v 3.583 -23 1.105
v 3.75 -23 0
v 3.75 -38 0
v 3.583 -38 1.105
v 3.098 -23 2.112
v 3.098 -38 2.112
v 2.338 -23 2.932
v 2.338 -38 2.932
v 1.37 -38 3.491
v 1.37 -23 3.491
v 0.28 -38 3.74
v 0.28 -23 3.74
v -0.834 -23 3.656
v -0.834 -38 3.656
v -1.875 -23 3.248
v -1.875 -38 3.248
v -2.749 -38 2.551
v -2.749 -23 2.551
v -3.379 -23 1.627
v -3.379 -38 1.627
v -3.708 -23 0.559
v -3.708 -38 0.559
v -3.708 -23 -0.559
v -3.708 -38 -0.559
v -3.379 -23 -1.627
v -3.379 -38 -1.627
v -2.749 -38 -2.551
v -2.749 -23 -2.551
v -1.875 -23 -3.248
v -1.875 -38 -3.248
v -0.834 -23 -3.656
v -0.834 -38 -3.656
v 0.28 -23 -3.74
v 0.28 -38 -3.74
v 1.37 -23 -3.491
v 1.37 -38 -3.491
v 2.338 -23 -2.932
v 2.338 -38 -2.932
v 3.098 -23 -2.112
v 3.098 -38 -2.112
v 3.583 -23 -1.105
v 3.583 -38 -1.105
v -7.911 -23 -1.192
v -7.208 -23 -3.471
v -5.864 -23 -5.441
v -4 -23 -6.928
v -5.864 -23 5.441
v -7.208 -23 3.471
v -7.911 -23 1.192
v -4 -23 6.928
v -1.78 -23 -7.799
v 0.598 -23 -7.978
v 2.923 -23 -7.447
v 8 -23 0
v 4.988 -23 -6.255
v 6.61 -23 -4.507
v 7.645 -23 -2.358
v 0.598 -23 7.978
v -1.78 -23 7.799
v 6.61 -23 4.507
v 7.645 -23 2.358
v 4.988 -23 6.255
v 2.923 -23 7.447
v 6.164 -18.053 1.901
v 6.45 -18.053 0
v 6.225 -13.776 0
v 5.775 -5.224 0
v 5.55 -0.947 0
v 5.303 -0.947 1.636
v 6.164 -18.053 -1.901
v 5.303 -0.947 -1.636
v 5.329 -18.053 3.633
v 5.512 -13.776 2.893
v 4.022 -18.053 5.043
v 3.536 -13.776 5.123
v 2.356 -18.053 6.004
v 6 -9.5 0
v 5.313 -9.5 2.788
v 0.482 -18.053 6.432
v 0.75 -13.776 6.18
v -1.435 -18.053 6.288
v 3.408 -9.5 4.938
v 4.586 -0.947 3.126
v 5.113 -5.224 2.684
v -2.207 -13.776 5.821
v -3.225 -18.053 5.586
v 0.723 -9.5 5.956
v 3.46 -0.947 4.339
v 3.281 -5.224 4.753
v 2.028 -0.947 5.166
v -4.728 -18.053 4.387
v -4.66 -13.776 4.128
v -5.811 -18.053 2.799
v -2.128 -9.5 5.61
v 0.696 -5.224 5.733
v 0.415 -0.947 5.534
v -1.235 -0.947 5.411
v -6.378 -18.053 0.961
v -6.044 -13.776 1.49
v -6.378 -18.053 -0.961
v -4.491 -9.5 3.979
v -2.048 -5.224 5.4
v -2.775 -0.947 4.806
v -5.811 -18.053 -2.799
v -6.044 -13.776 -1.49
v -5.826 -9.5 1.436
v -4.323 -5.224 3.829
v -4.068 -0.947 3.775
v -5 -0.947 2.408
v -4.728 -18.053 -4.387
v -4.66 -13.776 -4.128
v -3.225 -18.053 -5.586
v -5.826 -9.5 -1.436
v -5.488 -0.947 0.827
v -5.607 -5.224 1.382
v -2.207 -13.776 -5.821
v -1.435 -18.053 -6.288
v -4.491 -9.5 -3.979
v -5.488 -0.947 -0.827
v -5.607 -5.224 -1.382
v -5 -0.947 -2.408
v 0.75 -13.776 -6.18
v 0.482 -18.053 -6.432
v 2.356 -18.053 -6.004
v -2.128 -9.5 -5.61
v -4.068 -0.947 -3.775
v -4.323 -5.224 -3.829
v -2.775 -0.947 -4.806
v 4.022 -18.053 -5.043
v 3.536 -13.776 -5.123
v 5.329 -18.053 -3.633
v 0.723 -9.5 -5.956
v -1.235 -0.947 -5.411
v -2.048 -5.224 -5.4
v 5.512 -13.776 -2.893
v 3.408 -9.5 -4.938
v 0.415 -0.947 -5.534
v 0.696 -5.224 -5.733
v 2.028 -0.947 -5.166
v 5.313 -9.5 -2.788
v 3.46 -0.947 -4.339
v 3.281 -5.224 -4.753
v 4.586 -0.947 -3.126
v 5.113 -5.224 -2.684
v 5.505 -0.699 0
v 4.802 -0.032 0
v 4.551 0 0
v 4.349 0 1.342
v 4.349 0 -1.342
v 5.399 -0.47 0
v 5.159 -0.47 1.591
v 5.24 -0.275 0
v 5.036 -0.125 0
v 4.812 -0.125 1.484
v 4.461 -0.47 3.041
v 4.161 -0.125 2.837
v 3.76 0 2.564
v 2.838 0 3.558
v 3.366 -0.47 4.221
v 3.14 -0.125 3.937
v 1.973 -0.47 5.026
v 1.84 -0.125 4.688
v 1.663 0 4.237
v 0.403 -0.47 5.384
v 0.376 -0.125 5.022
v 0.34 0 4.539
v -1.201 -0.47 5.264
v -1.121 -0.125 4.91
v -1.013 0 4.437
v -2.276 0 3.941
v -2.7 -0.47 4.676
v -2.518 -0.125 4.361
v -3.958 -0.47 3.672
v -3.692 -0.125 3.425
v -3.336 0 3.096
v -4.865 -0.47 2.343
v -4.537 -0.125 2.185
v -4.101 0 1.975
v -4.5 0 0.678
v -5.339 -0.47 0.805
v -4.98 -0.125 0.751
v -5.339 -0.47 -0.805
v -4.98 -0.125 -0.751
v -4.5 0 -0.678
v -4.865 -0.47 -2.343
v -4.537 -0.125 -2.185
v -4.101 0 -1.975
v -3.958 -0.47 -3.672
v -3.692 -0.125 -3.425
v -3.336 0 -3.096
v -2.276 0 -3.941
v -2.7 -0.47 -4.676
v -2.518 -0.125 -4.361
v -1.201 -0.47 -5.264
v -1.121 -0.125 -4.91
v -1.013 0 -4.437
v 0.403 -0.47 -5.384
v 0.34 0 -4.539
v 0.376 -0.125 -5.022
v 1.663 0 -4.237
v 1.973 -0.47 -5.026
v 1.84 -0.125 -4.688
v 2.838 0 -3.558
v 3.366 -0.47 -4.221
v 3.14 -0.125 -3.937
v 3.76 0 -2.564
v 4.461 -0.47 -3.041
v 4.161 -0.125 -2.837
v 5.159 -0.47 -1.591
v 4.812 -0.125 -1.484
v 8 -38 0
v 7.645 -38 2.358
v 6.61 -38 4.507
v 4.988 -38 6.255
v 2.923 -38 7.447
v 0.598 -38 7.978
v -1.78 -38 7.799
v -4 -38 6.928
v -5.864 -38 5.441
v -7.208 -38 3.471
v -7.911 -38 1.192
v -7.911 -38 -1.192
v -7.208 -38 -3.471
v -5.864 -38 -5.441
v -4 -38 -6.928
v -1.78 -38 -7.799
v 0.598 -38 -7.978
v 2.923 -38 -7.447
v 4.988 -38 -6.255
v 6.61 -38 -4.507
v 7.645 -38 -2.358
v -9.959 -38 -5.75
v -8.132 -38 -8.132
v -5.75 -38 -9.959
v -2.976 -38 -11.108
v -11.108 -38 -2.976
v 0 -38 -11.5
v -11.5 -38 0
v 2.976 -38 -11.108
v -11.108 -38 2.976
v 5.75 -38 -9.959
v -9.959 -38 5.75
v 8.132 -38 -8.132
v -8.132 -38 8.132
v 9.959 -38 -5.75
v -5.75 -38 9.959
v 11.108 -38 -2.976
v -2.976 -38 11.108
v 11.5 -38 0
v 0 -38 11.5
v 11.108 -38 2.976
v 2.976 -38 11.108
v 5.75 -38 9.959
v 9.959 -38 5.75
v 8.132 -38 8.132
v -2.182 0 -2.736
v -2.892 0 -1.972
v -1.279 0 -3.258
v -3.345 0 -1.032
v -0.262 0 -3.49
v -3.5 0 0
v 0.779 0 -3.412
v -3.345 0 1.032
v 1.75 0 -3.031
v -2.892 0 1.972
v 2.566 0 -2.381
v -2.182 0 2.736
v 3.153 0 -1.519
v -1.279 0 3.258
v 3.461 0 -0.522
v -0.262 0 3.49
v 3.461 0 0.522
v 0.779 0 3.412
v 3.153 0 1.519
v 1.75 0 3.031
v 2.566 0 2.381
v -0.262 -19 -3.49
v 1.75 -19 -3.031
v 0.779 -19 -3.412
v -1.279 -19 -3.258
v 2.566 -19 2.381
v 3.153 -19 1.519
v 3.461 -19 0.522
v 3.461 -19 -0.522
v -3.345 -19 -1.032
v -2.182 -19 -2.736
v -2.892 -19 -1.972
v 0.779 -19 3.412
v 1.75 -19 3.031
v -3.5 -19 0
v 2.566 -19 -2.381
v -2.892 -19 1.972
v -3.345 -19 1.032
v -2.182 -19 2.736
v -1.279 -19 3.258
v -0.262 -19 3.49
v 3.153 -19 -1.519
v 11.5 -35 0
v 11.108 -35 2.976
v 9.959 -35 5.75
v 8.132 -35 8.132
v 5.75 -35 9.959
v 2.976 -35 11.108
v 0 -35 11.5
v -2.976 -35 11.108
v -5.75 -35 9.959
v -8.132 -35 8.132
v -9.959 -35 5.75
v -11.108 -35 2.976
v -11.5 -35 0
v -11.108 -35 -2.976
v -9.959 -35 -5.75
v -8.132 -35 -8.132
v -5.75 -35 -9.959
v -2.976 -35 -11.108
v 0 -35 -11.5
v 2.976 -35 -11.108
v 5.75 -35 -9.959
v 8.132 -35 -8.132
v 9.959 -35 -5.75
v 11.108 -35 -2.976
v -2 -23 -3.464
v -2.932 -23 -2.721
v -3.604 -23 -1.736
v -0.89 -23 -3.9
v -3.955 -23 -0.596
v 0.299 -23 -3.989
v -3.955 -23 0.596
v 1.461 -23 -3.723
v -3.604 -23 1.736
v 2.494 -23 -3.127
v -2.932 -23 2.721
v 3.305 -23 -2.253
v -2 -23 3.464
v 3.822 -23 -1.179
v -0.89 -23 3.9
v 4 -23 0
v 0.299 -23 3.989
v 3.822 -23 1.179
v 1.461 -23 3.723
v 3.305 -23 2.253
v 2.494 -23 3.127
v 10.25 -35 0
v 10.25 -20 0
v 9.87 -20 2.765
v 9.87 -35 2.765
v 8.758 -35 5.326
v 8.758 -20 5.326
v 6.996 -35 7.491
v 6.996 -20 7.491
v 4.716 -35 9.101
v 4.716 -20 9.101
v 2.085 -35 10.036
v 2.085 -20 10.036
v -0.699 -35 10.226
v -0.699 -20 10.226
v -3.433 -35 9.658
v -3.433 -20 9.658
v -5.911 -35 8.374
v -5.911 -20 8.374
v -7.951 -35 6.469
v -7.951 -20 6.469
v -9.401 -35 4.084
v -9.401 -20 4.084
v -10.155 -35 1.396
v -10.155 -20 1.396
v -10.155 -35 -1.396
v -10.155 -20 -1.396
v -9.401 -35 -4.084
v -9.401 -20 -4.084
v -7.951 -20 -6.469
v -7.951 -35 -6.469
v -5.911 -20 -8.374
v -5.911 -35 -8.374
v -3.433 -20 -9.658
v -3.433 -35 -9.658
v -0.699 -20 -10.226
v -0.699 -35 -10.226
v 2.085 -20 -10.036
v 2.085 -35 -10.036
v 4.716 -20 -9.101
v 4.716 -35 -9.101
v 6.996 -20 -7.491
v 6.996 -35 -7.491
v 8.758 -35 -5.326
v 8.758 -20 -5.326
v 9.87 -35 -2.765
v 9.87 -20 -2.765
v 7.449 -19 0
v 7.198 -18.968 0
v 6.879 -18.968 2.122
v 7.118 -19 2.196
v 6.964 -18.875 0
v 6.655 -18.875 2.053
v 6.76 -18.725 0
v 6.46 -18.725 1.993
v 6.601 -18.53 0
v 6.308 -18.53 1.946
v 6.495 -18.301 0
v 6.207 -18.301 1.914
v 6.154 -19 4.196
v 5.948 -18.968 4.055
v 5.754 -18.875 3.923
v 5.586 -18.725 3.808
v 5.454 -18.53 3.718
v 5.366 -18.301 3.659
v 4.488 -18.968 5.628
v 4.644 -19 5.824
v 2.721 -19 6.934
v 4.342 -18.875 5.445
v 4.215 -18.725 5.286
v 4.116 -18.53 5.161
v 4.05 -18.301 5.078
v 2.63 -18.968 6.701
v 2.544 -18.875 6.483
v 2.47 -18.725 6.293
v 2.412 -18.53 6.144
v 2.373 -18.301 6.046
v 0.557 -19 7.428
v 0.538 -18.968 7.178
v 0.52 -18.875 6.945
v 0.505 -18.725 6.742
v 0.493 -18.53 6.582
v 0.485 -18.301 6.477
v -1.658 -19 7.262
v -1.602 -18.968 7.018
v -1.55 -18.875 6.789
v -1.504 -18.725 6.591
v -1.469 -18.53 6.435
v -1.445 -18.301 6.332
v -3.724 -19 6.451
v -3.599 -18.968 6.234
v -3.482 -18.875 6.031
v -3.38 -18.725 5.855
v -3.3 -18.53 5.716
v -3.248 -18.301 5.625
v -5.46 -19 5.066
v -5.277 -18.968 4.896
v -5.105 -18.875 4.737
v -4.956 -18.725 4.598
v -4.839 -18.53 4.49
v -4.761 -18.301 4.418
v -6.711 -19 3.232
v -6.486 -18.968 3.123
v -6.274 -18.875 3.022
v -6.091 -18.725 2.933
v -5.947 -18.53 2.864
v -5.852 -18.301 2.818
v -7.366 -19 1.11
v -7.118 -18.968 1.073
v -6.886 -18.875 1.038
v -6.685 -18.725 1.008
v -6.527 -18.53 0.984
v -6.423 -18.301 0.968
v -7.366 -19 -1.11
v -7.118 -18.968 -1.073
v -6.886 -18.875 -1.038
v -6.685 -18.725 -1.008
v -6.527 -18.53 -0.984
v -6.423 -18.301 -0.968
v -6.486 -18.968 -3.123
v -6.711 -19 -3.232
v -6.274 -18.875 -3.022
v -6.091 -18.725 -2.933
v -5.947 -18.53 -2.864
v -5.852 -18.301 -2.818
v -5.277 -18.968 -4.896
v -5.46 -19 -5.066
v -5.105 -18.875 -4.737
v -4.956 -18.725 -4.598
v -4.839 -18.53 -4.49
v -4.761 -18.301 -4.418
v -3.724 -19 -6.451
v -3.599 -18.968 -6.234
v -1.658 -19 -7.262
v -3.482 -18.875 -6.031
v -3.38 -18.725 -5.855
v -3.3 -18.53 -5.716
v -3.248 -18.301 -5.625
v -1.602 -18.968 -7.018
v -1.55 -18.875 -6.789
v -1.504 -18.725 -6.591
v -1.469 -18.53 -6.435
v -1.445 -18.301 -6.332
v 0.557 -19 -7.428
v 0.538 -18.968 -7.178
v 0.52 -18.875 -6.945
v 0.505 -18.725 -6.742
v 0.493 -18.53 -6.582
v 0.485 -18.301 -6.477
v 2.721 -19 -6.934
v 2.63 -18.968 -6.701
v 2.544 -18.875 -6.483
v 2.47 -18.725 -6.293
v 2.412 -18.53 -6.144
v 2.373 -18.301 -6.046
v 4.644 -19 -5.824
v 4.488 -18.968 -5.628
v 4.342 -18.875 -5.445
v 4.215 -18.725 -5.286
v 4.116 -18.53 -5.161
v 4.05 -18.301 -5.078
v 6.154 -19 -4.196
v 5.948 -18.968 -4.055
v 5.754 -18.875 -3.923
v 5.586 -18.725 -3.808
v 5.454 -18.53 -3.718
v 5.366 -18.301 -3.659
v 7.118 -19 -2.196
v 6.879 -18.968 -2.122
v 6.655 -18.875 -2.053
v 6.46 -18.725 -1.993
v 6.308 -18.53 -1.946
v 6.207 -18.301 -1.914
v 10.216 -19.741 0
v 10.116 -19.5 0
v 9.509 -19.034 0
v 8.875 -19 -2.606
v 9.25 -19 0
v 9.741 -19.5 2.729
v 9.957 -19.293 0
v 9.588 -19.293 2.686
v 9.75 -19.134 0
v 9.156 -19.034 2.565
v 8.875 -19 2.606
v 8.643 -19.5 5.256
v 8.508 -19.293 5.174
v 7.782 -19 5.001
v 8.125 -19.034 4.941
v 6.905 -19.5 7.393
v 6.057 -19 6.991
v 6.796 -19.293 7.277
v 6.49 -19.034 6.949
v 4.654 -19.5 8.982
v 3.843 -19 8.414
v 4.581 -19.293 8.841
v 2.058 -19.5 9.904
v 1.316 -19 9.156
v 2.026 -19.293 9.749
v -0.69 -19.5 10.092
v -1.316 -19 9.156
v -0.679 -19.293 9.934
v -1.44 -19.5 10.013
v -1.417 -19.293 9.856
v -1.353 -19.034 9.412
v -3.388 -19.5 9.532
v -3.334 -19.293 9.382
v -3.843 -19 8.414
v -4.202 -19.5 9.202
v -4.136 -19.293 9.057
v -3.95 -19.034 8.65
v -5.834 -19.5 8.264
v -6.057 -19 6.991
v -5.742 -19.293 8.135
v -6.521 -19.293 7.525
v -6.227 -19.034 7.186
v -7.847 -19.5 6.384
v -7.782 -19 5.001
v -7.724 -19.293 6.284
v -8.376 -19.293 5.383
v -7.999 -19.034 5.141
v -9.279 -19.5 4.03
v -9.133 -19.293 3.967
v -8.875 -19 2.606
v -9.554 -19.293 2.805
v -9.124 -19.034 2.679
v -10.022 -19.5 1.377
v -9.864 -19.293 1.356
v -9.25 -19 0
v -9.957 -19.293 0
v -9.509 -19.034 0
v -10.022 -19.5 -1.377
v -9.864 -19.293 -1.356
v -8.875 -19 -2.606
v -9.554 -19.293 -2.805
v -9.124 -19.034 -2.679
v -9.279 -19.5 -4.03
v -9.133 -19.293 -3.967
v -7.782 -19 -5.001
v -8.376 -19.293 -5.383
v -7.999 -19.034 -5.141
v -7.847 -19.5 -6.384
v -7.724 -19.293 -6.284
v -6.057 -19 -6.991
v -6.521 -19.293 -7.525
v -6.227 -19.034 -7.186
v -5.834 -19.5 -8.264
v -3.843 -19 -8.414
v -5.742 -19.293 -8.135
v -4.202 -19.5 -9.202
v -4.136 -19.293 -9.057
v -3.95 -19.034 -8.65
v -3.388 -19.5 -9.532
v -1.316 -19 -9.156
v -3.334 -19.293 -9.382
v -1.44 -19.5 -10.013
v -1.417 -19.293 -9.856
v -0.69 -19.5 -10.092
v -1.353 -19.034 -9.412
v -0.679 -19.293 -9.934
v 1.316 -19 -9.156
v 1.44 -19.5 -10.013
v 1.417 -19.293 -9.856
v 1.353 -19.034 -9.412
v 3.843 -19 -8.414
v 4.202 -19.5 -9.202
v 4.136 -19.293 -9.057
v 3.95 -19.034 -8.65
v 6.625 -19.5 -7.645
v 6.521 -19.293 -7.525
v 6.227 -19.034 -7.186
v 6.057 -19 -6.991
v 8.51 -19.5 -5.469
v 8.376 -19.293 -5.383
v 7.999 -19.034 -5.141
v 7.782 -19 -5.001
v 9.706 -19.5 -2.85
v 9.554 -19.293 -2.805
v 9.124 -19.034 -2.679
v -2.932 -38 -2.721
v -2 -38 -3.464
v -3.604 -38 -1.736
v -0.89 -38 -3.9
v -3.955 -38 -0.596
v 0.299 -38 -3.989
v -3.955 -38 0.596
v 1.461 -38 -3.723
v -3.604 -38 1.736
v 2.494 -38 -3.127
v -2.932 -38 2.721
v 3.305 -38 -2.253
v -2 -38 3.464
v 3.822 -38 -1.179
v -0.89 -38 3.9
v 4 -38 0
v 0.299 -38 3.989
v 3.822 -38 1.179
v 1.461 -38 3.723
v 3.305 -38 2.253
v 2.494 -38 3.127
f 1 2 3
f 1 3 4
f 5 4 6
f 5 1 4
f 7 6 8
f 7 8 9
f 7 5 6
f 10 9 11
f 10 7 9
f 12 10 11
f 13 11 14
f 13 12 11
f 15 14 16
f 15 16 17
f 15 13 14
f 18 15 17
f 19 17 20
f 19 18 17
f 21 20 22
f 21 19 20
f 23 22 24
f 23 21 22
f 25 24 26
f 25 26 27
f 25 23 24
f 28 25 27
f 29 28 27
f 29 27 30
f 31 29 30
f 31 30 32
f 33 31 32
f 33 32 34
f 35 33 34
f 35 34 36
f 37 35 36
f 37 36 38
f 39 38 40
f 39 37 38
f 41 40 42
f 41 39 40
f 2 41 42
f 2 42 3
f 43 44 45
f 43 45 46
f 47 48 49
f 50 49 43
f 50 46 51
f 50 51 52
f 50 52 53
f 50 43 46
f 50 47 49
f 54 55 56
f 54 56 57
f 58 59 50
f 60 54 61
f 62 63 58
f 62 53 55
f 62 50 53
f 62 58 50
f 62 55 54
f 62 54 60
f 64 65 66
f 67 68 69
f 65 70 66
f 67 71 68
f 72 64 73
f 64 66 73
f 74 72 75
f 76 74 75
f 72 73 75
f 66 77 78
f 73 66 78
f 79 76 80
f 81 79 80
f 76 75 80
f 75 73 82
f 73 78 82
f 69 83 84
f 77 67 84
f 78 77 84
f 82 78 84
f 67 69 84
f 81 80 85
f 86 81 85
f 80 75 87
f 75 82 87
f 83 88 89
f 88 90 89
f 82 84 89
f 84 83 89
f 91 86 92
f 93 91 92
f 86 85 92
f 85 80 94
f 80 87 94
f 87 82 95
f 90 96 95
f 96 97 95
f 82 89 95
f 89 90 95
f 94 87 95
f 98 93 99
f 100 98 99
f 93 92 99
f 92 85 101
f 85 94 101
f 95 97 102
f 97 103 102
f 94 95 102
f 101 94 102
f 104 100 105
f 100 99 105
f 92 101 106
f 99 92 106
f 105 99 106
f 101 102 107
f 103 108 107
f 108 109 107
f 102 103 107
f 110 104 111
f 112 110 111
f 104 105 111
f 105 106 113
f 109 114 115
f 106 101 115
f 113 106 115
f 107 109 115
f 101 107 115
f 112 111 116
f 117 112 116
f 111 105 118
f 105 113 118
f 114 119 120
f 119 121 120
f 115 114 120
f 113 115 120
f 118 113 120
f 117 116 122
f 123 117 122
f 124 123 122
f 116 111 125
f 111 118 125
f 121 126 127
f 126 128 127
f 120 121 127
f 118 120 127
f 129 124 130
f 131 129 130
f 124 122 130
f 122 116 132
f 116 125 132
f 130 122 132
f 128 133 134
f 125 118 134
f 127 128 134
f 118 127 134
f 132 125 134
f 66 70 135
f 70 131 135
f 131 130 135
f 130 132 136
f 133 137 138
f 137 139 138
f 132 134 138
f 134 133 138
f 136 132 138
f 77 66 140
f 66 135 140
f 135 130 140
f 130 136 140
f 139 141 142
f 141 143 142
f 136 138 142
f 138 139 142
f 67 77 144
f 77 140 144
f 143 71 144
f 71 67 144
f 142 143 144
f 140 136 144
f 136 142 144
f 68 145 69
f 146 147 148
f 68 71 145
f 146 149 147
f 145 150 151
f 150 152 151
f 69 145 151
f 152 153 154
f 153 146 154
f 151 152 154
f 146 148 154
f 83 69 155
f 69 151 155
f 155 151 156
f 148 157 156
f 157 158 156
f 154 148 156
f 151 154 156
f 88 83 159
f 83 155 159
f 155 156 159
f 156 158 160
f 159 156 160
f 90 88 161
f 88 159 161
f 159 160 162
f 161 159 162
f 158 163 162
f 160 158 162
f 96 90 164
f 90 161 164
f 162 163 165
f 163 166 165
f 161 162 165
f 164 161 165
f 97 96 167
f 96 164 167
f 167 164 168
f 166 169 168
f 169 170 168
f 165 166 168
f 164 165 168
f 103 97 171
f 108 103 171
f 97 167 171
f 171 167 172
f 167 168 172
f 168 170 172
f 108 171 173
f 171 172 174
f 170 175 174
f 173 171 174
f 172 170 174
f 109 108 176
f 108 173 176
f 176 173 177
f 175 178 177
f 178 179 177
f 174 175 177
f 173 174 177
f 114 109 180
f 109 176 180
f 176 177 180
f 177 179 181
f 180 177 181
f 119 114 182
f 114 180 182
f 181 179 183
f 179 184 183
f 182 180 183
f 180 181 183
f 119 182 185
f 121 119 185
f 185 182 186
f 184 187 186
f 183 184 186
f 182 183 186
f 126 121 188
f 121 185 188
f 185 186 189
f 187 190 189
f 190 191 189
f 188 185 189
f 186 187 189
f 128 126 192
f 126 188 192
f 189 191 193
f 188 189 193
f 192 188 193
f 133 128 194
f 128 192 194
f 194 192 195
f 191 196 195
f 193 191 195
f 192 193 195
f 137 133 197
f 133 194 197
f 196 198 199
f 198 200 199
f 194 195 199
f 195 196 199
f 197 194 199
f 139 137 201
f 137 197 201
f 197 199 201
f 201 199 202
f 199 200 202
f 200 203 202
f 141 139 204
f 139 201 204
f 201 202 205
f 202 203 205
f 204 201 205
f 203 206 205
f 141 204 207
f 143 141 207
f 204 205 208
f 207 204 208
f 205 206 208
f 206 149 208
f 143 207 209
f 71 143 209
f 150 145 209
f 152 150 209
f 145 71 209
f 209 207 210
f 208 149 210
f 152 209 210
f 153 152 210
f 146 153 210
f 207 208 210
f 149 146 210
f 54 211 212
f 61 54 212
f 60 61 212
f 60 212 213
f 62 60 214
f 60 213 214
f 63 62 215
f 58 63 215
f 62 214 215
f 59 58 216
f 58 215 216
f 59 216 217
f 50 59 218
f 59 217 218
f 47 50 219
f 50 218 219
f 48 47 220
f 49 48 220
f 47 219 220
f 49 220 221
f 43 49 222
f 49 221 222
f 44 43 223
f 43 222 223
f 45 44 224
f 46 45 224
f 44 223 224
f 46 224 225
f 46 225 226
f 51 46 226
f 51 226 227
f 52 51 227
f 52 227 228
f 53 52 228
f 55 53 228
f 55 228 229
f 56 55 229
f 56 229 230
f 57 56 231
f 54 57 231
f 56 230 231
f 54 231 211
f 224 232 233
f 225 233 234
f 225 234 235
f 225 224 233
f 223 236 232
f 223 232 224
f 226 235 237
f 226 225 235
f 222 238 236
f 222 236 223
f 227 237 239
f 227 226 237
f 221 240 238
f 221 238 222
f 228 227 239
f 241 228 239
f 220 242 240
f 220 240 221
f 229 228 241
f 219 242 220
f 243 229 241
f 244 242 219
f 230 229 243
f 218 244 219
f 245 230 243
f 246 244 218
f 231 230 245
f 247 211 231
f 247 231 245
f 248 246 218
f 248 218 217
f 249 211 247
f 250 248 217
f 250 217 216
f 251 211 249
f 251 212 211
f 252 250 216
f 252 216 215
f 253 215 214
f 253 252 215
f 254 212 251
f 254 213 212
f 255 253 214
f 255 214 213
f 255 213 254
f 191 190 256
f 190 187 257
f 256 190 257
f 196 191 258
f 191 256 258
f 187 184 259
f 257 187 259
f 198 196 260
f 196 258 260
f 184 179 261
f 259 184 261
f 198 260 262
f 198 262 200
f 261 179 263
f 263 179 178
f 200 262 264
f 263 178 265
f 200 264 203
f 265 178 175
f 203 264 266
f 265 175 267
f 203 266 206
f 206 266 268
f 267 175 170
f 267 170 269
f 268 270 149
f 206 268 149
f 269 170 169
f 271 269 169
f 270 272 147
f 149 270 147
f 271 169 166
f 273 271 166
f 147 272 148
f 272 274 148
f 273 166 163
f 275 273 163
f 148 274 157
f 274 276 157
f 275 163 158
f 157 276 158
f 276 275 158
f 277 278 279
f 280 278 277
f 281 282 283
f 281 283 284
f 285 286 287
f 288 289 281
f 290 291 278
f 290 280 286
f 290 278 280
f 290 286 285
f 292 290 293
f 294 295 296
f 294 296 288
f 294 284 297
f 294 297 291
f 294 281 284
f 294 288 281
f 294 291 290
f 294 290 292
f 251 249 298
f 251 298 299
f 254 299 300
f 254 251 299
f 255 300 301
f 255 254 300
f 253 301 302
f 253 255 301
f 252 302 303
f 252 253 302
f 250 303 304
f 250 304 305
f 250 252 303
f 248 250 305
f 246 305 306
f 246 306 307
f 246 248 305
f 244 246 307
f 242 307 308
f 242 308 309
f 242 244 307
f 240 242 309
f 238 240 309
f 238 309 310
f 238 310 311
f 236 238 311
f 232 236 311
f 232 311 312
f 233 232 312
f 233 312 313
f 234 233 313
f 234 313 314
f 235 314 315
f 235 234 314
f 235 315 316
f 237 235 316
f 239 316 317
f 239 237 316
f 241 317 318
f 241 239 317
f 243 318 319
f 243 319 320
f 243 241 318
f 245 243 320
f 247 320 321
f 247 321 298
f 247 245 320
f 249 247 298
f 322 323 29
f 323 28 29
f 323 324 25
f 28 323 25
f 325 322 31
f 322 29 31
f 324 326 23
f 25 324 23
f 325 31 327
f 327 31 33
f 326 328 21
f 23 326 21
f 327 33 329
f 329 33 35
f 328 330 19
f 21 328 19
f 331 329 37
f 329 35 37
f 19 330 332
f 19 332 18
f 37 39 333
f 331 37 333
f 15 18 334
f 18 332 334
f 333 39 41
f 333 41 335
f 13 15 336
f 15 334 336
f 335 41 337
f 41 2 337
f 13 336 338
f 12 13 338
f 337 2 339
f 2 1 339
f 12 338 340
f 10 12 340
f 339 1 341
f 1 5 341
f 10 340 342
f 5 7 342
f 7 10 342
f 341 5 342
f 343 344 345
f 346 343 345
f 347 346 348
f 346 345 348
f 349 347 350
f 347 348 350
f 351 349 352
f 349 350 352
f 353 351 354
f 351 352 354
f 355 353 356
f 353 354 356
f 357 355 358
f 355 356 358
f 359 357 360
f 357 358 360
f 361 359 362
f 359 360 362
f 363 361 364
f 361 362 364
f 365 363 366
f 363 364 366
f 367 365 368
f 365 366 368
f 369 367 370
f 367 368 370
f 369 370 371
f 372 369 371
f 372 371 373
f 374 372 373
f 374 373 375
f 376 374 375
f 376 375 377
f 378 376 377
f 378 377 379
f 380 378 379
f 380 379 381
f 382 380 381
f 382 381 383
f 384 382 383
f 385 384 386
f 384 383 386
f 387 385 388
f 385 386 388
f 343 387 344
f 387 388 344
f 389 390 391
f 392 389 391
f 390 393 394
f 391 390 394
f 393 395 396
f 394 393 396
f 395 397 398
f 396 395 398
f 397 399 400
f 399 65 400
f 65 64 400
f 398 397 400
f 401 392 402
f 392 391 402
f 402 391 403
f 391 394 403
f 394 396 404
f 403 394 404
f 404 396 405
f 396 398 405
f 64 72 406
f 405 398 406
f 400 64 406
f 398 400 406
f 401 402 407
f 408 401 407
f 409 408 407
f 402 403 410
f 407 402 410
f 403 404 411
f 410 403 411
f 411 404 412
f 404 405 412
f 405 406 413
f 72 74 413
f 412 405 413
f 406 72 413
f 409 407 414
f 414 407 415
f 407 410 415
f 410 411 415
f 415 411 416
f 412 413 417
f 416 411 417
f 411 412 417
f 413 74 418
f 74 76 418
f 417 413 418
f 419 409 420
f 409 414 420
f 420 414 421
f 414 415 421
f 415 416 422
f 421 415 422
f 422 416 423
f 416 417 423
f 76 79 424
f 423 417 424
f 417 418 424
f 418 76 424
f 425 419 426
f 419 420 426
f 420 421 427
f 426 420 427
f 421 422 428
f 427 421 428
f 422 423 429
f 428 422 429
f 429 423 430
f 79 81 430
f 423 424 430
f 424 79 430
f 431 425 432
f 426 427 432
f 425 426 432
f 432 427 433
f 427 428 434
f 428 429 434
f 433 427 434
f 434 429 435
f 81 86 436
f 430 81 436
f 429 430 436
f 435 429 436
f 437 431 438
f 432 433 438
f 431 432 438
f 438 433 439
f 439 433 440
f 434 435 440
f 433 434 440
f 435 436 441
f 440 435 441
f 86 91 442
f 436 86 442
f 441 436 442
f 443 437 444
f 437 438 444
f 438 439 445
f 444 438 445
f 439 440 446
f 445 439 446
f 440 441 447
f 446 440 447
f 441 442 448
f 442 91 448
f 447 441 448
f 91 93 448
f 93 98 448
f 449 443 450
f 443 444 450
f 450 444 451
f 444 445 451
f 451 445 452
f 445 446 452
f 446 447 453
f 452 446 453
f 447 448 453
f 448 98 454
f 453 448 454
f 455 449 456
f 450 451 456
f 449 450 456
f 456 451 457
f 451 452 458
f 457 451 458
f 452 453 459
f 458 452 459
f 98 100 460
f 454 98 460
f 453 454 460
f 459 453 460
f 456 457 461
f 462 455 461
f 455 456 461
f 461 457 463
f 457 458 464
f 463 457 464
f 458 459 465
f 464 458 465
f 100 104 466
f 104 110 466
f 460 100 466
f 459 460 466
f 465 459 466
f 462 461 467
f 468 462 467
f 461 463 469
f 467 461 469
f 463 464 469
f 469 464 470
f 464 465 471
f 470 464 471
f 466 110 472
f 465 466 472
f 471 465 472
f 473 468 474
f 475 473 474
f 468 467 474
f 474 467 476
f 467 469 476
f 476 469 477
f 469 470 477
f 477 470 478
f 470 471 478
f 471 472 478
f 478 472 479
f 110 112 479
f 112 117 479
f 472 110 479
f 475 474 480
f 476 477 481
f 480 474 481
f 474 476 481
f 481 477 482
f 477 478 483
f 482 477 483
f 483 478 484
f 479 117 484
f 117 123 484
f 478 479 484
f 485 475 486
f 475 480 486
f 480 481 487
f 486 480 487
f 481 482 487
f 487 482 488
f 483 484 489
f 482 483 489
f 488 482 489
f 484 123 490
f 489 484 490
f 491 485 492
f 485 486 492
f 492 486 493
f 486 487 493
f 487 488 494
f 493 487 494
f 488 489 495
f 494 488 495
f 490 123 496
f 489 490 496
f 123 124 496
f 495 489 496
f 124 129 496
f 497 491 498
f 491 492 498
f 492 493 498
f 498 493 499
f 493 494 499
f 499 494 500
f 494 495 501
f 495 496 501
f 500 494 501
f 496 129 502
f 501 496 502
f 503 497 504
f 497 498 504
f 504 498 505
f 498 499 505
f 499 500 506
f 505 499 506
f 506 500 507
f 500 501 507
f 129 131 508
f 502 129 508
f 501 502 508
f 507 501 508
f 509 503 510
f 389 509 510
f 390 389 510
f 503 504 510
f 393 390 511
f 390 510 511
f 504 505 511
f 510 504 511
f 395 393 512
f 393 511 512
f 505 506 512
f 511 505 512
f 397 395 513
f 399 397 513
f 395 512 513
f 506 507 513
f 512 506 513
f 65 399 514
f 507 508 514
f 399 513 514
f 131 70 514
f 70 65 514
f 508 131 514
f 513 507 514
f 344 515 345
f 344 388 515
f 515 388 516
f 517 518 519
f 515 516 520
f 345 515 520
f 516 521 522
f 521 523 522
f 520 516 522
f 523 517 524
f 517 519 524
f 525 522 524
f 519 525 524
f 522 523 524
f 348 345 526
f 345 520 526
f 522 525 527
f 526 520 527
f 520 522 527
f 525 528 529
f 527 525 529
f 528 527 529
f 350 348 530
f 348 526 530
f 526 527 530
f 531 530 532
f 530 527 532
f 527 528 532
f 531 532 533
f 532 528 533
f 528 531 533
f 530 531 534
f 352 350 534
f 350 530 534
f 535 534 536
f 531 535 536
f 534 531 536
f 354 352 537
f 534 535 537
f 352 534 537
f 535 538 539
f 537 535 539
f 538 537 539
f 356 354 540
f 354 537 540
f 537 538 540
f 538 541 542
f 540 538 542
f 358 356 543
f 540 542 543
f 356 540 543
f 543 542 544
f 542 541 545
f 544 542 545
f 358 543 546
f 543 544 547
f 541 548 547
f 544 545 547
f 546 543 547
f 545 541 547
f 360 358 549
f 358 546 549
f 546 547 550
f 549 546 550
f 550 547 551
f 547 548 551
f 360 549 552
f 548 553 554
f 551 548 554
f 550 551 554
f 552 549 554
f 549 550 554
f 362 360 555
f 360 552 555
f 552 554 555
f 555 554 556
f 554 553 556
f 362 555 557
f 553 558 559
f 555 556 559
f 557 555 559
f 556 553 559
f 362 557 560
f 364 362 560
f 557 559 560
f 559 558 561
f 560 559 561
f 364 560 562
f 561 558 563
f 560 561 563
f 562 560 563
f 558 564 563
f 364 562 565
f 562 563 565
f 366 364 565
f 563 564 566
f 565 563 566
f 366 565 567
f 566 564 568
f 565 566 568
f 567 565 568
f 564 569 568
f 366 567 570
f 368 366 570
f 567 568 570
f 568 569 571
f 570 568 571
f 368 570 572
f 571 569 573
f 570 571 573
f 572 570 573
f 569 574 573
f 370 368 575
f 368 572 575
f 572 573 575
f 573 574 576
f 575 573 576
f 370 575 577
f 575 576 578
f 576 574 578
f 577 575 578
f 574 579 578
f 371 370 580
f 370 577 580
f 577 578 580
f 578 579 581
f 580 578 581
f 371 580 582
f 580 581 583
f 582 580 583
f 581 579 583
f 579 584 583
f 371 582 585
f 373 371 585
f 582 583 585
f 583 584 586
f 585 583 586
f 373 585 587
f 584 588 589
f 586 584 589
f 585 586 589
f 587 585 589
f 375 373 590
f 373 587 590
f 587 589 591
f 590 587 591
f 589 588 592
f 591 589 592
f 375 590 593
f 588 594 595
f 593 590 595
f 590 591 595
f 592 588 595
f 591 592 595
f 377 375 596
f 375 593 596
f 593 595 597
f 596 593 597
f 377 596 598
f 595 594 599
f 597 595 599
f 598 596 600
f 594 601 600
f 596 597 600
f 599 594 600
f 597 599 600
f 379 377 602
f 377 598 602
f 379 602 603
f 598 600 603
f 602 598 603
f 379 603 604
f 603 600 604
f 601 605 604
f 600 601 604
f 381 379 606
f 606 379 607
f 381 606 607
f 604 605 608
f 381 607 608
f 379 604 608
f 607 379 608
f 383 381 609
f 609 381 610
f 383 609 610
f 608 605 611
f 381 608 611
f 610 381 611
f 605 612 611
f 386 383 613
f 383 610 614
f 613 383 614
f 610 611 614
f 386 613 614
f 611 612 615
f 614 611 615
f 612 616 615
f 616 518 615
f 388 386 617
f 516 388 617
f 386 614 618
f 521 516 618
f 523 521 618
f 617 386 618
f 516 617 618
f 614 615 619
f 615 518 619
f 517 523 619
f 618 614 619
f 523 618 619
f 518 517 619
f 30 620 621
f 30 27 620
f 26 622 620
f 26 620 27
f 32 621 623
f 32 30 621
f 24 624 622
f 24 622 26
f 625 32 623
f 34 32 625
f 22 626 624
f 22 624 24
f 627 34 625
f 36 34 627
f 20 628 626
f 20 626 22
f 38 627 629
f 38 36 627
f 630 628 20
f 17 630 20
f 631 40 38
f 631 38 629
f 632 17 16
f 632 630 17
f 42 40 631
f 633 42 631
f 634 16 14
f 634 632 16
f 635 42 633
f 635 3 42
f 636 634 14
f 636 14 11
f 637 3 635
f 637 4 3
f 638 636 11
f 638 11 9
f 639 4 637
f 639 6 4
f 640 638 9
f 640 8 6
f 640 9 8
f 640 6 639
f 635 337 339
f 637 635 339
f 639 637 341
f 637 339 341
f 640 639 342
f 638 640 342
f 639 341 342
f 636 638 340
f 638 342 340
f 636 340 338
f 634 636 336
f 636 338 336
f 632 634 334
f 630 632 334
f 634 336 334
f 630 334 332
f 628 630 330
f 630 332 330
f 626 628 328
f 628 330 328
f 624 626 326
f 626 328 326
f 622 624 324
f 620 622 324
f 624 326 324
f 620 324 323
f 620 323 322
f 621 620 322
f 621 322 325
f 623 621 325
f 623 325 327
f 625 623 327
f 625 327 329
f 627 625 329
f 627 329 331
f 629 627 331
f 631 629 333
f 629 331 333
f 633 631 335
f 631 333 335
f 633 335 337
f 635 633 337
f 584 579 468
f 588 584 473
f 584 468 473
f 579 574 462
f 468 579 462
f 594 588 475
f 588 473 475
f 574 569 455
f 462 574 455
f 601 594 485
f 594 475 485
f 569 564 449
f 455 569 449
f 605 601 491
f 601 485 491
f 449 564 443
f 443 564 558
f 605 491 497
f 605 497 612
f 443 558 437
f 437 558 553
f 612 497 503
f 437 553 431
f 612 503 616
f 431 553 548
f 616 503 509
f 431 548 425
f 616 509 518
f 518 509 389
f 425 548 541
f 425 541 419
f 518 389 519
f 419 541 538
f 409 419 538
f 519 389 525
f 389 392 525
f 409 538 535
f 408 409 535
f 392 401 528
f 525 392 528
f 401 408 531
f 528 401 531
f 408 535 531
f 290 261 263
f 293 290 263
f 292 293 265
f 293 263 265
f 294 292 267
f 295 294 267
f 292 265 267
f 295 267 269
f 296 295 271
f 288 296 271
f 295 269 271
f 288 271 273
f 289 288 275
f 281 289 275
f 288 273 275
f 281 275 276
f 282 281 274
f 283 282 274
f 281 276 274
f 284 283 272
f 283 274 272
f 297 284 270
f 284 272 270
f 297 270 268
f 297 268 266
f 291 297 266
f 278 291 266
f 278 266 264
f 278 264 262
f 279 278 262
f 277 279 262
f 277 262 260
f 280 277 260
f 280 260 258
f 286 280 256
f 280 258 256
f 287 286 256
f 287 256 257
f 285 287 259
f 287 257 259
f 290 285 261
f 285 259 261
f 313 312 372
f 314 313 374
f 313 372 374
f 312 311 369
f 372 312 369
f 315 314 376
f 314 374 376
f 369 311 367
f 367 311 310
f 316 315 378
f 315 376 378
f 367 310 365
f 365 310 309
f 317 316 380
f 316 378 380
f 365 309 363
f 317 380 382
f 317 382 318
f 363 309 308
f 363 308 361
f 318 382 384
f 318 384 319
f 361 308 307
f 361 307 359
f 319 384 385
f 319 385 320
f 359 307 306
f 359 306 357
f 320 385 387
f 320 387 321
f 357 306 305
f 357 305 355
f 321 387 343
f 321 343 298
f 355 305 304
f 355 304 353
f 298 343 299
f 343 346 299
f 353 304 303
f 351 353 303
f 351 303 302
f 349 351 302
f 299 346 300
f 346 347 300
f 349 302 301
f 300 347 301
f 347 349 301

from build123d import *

# Parameters (mm, degrees)
F2_R      = 6.5
F0_R      = 5.5
F4_R      = 10.25
F5_DEPTH  = 19
F6_R      = 11.5
F7_DEPTH  = 3
F8_R      = 3.5
F9_DEPTH  = 19
F10_R     = 8
F11_DEPTH = 15
F12_R     = 4
F12_R_2   = 3.75
F13_DEPTH = 15
F14_R     = 1


with BuildPart() as f3:
    # F2 (on offset) → F3 section 0
    with BuildSketch(Plane.XZ.offset(19)):
        Circle(F2_R)
    # F0 (on Front) → F3 section 1
    with BuildSketch(Plane.XZ):
        Circle(F0_R)
    loft()

    # F4 (on face) → F5 (join)
    with BuildSketch(Plane.XZ.offset(19)):
        Circle(F4_R)
    extrude(amount=F5_DEPTH)

    # F6 (on face) → F7 (join)
    with BuildSketch(Plane.XZ.offset(38)):
        Circle(F6_R)
    extrude(amount=-F7_DEPTH)

    # F8 (on face) → F9 (cut)
    with BuildSketch(Plane(origin=(0, 0, 0), x_dir=(-1, 0, 0), z_dir=(0, 1, 0))):
        Circle(F8_R)
    extrude(amount=-F9_DEPTH, mode=Mode.SUBTRACT)

    # F10 (on face) → F11 (cut)
    with BuildSketch(Plane.XZ.offset(38)):
        Circle(F10_R)
    extrude(amount=-F11_DEPTH, mode=Mode.SUBTRACT)

    # F14
    f14_edges = [f3.edges().sort_by_distance(p)[0] for p in [
        (-5.5, 0, 0),
        (-10.25, -19, 0),
        (-6.5, -19, 0),
    ]]
    fillet(f14_edges, radius=F14_R)


with BuildPart() as f13:
    # F12 (on face) → F13 (new body)
    with BuildSketch(Plane.XZ.offset(23)):
        Circle(F12_R)
        Circle(F12_R_2, mode=Mode.SUBTRACT)
    extrude(amount=F13_DEPTH)


solid = Compound([f3.part, f13.part])
